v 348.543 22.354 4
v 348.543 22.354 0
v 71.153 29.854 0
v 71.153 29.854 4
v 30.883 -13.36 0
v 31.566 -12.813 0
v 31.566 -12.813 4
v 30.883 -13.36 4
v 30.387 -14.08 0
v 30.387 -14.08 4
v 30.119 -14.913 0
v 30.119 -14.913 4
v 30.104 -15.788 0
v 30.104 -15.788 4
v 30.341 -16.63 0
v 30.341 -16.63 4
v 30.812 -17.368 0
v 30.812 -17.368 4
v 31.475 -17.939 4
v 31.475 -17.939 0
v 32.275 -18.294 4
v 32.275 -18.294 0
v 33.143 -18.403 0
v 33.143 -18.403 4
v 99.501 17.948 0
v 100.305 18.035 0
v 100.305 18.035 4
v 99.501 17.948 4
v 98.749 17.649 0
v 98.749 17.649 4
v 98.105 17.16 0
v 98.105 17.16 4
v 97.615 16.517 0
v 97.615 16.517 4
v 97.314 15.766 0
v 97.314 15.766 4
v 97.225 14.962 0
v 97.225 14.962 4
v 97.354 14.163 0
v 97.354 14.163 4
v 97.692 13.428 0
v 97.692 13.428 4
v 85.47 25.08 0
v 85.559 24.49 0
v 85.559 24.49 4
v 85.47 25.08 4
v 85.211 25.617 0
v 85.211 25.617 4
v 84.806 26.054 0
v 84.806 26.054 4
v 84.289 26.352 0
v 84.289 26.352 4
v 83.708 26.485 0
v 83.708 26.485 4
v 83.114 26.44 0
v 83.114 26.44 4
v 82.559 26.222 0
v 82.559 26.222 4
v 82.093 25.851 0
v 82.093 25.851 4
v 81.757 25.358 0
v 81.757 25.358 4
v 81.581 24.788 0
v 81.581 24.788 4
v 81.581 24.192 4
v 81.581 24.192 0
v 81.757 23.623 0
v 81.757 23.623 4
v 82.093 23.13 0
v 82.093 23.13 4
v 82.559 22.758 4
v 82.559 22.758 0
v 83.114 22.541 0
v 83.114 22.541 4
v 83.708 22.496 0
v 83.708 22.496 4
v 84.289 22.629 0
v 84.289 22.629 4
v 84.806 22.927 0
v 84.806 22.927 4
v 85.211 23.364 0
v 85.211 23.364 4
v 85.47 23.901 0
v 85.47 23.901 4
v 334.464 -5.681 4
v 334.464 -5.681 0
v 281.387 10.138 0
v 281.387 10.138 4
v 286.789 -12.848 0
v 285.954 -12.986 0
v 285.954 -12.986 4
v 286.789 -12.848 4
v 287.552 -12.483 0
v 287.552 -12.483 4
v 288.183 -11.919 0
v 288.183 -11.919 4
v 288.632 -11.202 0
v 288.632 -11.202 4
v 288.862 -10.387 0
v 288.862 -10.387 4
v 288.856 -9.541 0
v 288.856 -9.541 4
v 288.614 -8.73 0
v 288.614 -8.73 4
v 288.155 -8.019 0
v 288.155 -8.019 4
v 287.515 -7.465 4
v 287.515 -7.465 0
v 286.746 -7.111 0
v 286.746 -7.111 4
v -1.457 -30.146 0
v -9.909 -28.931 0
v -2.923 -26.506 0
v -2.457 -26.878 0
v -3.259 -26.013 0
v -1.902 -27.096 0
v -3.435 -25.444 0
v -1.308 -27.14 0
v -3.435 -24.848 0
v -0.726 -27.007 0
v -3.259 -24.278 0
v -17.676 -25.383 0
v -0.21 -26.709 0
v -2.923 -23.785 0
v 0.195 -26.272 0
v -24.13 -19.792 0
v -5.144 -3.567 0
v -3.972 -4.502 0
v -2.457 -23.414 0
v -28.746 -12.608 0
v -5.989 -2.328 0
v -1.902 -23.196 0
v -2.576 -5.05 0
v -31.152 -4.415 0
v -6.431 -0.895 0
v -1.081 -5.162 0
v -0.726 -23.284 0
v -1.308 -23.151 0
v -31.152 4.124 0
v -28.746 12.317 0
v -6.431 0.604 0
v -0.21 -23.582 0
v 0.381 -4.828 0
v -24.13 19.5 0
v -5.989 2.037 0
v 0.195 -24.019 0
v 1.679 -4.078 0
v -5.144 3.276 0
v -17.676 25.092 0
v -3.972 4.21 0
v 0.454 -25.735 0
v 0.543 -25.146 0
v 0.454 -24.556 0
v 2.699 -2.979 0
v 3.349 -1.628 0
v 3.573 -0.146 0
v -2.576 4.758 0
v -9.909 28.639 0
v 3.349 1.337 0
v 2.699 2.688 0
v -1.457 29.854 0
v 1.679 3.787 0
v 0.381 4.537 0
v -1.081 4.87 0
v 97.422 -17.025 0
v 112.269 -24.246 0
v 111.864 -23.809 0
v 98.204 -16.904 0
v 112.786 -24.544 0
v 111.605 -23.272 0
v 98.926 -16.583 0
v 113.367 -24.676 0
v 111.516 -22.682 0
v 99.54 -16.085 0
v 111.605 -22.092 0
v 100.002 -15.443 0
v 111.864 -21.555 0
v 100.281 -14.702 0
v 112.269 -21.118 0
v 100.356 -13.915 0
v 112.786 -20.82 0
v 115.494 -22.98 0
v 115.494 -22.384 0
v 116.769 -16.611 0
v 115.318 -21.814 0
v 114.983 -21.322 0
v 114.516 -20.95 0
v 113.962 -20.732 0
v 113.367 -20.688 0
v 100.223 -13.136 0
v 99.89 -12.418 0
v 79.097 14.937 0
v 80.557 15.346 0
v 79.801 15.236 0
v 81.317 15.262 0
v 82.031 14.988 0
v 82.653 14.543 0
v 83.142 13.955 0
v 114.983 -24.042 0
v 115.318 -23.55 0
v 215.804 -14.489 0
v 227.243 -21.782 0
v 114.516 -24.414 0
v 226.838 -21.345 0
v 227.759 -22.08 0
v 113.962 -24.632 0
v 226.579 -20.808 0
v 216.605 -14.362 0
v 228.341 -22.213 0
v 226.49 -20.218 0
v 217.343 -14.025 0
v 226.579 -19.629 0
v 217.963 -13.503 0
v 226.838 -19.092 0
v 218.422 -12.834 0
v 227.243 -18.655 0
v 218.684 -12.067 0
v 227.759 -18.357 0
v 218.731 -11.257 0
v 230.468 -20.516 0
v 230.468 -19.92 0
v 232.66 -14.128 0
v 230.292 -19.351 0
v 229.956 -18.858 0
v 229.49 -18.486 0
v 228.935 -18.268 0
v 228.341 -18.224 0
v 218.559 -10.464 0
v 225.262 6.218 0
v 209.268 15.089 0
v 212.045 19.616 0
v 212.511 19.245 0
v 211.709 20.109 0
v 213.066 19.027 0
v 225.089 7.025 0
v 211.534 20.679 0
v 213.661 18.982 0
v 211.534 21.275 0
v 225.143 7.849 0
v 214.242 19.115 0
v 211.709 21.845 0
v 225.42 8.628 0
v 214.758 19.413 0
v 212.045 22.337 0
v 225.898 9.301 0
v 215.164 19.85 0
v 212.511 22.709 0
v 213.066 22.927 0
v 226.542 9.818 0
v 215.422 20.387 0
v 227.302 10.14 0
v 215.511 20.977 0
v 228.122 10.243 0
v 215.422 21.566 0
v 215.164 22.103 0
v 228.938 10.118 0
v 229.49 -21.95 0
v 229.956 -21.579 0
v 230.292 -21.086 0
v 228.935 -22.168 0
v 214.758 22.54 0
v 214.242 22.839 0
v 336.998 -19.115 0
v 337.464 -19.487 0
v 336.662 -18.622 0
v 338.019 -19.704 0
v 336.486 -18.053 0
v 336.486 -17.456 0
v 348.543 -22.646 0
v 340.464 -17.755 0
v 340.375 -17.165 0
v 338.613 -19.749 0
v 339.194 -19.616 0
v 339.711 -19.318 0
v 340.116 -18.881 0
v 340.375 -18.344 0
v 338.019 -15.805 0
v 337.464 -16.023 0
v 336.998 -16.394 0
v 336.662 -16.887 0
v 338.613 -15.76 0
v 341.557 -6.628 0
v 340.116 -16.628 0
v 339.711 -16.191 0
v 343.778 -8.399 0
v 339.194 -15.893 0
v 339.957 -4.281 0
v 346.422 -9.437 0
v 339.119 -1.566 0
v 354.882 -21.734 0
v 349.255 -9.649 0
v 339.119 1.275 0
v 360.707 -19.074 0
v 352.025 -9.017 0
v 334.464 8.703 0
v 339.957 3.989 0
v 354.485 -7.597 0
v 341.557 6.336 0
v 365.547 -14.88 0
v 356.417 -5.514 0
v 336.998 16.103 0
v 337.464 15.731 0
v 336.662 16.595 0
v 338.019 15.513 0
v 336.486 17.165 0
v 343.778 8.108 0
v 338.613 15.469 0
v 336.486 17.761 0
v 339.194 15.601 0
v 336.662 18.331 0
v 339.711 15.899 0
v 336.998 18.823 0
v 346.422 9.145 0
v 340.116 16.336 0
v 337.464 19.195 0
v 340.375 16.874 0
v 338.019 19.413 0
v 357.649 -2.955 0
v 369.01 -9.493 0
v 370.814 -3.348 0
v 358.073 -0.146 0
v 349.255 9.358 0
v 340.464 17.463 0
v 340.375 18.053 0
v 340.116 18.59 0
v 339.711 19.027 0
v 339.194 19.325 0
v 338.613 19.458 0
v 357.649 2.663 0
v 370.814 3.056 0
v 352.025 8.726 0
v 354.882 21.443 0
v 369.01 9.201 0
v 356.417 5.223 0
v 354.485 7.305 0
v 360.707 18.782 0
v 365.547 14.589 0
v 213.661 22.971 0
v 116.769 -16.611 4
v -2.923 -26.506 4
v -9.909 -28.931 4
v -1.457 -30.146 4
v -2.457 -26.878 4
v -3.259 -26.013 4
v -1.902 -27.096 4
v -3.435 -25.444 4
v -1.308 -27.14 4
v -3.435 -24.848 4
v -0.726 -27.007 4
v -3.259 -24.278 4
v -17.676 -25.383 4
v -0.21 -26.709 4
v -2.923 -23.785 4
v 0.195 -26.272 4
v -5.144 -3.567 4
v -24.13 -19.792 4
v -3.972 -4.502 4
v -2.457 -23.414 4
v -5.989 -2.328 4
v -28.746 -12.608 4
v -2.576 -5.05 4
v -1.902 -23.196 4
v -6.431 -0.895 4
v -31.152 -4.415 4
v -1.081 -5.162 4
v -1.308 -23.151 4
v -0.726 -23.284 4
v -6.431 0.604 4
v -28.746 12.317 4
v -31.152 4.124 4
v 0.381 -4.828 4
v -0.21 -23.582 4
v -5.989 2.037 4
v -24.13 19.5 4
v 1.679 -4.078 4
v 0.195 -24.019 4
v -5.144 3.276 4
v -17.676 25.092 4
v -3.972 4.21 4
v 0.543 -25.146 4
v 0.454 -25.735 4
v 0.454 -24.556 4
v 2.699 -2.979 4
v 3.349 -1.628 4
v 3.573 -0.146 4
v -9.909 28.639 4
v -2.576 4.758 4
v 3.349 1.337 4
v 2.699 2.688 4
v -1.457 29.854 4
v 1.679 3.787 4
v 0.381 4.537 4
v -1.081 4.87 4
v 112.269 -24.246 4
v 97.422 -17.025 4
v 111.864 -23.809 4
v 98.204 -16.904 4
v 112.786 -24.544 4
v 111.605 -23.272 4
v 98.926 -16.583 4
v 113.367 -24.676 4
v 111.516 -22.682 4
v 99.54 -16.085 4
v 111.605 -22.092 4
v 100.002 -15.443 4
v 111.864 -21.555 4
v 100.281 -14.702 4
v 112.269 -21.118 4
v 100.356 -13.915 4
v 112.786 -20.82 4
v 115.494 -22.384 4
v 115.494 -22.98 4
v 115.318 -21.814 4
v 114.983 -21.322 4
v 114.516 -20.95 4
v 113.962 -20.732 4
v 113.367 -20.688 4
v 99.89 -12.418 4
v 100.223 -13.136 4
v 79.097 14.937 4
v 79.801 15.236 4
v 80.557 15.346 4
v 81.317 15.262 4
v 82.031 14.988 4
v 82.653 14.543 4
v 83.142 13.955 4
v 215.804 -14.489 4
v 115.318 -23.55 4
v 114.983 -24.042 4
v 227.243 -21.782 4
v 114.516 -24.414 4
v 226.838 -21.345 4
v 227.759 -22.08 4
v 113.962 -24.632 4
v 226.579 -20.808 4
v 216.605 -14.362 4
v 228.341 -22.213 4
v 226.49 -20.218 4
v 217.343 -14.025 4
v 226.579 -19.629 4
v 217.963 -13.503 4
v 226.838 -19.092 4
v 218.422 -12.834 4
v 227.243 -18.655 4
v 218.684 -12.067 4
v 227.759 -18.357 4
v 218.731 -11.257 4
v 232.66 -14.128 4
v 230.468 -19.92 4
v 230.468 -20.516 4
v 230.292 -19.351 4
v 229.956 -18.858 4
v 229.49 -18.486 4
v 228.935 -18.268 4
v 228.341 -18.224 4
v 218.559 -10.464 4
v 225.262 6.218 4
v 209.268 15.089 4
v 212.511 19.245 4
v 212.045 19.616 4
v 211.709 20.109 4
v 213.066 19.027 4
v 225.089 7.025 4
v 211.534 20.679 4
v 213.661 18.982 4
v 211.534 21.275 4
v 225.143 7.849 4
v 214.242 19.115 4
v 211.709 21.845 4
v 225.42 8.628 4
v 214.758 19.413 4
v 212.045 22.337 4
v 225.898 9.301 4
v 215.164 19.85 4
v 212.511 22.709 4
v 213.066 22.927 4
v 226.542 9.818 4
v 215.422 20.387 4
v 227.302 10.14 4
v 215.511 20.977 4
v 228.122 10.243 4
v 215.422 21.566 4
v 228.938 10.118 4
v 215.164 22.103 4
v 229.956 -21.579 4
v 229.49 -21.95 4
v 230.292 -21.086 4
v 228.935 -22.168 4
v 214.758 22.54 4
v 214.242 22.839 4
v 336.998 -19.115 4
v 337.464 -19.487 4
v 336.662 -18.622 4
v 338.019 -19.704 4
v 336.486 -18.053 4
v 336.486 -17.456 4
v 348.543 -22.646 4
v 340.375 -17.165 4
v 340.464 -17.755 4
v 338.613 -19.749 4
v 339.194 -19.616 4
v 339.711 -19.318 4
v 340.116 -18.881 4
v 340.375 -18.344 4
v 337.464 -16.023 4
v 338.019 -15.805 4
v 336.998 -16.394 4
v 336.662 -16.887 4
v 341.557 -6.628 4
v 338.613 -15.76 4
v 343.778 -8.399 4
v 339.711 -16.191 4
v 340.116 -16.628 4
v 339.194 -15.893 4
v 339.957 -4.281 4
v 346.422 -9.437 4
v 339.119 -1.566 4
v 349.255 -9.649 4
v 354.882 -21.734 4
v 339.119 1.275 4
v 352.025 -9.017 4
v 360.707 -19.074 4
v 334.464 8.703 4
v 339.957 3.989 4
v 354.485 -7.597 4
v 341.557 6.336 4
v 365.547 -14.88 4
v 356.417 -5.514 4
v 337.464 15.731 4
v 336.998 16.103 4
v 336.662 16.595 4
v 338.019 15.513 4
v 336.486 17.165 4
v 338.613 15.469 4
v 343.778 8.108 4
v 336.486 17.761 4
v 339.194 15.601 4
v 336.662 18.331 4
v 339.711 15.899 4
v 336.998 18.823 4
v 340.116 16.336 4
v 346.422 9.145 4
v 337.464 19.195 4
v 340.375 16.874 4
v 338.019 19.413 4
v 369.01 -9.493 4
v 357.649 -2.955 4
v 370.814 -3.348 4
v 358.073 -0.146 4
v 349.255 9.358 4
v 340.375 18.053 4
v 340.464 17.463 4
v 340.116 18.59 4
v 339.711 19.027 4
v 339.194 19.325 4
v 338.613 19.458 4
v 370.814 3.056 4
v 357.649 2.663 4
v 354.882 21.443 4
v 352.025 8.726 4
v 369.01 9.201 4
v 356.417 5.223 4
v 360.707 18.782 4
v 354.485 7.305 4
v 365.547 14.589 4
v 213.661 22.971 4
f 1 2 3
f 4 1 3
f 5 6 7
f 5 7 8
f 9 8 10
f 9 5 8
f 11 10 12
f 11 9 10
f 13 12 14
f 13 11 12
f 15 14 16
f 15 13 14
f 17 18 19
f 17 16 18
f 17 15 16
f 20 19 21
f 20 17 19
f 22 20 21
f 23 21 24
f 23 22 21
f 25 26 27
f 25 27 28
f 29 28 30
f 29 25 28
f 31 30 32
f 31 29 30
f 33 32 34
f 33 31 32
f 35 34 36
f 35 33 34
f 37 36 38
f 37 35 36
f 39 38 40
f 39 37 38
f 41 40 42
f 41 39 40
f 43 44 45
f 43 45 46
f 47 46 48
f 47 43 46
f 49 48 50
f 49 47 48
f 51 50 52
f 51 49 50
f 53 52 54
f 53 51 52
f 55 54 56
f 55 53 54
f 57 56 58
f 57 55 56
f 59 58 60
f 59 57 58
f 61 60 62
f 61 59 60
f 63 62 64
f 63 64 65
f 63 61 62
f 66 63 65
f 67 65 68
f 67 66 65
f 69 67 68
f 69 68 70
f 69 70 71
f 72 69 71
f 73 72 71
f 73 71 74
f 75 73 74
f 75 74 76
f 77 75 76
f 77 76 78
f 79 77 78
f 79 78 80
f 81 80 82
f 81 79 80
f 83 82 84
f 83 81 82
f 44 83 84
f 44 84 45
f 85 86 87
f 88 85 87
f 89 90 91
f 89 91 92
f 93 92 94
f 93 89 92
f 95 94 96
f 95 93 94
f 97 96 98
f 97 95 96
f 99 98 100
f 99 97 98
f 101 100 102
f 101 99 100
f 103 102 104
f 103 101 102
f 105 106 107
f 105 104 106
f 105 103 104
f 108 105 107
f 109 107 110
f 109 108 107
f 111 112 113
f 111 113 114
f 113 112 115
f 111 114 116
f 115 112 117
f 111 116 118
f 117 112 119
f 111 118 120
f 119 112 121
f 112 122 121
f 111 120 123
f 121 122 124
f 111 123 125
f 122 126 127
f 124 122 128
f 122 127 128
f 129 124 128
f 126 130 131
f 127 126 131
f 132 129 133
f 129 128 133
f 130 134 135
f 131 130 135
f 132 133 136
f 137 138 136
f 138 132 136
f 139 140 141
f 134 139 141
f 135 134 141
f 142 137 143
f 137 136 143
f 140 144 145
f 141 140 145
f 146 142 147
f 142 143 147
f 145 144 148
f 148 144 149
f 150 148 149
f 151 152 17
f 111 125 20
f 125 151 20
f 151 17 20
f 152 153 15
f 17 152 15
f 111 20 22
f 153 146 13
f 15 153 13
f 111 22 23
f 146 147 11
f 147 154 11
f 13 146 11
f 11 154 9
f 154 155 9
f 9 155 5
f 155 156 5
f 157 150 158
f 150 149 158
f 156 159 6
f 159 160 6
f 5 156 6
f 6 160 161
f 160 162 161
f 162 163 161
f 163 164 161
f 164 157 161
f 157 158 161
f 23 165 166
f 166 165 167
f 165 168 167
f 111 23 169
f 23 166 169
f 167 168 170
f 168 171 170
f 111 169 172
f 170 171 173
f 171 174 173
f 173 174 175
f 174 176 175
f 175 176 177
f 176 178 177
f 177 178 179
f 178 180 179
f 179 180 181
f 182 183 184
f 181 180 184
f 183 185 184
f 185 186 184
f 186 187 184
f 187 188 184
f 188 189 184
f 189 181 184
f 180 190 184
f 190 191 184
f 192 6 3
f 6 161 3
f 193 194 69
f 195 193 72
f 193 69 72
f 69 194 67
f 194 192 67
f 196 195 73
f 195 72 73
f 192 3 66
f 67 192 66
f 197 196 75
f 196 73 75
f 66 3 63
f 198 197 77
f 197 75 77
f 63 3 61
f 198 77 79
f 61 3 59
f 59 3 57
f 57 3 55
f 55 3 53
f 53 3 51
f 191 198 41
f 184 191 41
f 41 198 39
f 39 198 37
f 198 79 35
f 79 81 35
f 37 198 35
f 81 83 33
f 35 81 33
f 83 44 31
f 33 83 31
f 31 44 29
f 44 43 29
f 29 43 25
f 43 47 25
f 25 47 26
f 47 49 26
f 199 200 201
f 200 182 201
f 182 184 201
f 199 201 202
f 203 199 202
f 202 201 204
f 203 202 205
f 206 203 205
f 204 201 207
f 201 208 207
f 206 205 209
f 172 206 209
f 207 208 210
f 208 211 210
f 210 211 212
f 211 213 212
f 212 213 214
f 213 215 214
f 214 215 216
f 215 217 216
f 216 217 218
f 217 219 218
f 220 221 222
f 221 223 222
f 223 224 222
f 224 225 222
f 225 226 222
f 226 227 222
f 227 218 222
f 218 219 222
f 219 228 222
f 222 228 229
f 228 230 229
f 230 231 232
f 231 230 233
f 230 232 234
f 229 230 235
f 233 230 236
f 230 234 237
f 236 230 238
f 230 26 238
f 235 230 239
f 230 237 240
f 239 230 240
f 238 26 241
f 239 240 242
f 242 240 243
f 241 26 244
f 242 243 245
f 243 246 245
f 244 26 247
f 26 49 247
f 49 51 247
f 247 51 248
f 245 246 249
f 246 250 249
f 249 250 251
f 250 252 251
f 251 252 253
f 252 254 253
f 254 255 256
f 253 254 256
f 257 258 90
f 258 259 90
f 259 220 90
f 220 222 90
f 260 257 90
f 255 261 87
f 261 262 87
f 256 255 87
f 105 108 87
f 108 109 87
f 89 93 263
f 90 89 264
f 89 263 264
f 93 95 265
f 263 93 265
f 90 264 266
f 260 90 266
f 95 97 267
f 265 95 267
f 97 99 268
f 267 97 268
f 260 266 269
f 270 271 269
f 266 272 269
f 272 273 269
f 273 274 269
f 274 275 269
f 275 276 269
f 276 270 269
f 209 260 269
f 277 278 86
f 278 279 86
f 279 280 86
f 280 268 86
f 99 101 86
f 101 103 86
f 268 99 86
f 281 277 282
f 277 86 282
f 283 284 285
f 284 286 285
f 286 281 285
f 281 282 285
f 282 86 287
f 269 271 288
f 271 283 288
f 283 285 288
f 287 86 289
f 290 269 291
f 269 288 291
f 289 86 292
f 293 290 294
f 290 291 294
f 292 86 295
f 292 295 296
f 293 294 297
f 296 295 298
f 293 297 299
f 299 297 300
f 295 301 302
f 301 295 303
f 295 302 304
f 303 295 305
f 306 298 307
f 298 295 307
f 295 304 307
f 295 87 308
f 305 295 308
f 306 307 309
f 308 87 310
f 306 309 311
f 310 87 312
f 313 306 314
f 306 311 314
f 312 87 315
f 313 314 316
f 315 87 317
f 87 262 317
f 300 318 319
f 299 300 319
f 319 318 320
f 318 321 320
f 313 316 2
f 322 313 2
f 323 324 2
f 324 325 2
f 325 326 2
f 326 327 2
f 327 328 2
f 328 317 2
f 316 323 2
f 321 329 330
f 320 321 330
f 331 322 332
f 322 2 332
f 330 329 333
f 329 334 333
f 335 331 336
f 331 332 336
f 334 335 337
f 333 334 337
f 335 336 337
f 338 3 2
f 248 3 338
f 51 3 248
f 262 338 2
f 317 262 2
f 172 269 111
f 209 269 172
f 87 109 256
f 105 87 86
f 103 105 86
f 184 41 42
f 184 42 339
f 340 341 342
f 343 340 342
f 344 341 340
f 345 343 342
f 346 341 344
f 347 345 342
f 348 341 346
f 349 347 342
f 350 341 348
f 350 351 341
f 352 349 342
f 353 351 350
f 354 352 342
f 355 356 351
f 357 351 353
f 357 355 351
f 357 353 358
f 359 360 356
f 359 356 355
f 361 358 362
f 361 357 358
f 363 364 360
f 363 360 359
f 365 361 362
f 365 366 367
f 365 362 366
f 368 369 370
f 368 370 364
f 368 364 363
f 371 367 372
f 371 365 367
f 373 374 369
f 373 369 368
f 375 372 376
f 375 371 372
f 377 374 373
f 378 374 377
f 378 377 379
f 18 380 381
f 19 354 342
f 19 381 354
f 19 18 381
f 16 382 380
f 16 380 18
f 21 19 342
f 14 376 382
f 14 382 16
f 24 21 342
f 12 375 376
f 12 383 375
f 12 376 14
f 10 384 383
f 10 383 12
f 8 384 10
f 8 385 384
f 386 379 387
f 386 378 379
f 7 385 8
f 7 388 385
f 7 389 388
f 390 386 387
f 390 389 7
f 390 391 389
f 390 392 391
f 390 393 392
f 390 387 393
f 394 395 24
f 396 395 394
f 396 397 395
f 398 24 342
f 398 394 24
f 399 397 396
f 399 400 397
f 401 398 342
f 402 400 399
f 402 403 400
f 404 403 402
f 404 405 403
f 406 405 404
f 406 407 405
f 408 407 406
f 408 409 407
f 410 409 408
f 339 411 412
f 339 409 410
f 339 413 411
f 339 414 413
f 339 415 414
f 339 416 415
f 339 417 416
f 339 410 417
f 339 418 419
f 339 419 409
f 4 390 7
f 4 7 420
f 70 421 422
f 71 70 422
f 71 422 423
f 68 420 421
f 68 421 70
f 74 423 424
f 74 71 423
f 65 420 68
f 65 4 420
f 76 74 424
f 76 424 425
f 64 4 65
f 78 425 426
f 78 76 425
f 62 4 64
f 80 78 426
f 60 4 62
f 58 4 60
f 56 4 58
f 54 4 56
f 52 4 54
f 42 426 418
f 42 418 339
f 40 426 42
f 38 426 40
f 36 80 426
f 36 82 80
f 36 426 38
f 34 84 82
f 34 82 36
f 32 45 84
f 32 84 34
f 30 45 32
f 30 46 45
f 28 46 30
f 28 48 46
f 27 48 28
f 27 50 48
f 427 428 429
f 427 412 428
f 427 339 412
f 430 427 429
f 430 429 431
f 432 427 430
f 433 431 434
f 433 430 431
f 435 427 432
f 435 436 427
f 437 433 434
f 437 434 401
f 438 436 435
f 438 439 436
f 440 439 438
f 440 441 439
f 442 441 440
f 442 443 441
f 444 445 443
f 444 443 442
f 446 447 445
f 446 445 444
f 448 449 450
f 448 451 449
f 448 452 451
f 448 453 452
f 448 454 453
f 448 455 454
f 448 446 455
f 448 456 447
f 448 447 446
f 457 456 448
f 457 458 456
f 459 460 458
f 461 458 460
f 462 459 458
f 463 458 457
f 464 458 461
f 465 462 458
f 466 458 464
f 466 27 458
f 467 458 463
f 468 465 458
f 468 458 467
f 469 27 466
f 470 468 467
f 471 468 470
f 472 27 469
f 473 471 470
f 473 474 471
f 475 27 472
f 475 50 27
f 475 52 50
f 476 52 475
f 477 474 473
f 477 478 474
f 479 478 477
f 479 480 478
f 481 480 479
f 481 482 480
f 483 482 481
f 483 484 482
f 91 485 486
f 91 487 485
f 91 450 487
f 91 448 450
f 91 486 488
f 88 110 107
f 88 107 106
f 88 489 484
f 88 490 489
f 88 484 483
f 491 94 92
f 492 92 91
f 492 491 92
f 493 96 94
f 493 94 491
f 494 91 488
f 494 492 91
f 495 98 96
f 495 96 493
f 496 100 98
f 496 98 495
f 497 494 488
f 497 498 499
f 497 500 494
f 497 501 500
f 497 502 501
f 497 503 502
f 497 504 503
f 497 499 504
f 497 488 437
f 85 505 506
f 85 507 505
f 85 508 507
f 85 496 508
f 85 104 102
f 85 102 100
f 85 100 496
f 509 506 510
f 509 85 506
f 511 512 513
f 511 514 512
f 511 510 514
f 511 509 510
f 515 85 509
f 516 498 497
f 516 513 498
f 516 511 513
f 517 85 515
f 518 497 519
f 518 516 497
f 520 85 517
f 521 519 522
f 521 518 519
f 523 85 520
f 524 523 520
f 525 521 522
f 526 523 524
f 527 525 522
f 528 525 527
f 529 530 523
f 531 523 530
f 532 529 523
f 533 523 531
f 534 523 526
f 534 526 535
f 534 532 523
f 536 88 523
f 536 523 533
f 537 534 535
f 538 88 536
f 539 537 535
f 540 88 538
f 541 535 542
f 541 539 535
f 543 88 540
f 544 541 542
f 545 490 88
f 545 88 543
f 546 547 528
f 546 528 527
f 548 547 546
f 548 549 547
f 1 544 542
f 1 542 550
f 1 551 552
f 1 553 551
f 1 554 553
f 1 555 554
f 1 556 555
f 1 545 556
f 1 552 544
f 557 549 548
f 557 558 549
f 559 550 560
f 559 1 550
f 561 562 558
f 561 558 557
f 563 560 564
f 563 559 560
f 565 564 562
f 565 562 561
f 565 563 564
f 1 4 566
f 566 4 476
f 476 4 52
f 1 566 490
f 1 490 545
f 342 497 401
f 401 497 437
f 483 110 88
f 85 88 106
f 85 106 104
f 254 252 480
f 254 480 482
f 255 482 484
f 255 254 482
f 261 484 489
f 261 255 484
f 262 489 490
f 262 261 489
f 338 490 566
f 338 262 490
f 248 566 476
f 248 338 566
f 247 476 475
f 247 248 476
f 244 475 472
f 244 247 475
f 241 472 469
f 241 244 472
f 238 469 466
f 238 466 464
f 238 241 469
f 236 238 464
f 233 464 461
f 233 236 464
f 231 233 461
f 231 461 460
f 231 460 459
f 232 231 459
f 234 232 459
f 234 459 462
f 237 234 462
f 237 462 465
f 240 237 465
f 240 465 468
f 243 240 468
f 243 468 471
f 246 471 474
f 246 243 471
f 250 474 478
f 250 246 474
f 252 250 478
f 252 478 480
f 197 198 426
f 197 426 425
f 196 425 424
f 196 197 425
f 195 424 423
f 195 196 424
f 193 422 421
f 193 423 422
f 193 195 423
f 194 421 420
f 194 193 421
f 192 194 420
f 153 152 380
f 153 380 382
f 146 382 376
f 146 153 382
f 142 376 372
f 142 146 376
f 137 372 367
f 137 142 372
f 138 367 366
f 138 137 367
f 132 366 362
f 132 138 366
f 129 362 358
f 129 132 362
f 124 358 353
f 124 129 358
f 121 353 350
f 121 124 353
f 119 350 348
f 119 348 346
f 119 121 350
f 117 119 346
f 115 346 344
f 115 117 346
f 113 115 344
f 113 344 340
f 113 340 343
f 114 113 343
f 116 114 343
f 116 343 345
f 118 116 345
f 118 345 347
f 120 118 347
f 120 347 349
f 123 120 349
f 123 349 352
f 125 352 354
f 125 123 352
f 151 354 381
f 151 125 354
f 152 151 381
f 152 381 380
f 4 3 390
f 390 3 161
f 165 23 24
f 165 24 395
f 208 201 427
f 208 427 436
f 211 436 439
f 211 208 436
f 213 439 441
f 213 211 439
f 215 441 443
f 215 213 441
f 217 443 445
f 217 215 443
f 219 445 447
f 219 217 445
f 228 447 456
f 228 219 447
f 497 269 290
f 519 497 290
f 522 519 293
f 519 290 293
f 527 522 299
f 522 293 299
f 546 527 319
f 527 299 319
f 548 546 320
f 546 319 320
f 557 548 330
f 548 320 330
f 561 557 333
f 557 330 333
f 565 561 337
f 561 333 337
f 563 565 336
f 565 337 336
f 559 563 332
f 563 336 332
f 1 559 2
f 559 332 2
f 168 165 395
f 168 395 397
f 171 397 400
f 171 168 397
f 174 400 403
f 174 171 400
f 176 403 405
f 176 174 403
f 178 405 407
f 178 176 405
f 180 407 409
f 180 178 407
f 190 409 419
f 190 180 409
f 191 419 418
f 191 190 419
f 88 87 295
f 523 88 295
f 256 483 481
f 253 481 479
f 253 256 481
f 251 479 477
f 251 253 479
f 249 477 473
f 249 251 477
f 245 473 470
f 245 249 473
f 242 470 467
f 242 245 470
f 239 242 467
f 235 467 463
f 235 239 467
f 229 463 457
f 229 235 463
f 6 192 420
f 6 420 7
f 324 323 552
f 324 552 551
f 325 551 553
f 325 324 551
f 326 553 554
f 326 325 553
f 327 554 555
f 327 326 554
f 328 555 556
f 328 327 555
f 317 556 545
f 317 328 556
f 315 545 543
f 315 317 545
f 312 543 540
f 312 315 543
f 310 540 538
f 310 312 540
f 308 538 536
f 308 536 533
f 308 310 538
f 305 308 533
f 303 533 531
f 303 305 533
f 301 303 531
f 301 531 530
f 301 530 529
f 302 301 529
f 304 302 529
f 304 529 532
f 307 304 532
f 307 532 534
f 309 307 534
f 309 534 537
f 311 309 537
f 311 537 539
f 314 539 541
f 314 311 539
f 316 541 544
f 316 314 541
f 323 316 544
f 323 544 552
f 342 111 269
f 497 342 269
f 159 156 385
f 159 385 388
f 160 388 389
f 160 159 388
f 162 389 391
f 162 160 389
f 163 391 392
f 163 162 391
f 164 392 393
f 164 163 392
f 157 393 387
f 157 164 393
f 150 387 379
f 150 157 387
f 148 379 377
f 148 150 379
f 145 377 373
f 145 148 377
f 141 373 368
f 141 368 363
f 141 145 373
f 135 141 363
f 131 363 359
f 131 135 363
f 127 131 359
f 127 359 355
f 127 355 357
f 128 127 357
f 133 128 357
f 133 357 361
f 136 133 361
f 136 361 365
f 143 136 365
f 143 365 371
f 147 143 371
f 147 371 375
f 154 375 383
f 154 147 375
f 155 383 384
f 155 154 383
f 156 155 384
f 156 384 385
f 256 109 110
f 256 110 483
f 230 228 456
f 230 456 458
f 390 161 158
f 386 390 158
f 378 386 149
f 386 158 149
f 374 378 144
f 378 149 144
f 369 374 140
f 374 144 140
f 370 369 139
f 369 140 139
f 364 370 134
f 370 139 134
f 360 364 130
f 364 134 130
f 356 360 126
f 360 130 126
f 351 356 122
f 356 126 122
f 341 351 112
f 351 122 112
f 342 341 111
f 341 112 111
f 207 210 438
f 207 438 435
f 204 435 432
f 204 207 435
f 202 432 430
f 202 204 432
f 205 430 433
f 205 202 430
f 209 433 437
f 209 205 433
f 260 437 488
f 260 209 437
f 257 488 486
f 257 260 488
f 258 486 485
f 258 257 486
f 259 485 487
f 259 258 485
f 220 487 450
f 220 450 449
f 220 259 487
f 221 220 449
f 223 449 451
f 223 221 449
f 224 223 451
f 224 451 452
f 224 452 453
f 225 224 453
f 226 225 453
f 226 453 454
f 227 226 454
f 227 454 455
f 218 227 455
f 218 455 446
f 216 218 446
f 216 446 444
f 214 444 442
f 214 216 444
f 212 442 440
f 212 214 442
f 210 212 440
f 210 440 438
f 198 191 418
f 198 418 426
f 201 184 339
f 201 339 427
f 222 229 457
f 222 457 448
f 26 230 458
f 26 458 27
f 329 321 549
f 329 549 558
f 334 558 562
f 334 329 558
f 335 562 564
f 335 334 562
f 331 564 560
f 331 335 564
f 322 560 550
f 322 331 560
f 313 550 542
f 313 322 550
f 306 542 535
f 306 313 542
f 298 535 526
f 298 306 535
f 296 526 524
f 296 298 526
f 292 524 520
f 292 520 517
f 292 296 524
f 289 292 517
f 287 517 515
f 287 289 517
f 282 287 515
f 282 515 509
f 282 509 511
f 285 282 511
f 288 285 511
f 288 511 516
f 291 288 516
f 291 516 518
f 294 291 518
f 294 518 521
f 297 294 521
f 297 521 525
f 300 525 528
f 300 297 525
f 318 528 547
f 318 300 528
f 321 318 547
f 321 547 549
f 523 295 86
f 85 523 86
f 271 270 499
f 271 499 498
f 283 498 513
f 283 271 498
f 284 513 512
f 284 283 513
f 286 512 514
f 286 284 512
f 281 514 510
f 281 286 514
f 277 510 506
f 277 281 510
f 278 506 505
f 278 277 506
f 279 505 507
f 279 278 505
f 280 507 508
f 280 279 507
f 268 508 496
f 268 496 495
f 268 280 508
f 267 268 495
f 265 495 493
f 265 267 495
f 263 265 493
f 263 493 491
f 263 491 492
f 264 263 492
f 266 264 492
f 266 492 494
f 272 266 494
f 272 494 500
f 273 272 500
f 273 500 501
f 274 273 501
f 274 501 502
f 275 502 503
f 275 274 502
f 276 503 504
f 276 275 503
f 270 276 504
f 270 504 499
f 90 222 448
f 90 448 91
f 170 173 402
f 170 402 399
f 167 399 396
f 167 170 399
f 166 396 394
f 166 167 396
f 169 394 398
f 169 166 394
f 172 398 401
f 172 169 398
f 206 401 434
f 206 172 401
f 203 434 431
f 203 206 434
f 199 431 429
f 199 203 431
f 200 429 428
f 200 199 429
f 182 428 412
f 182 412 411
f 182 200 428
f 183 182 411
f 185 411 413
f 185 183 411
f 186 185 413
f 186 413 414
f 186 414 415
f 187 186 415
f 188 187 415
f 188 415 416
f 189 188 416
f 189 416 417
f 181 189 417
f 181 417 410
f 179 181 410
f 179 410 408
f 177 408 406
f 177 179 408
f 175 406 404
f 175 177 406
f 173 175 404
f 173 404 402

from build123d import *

# Parameters (mm, degrees)
SKETCH_1_R          = 5.03
SKETCH_1_R_2        = 9.53
SKETCH_1_R_3        = 2
EXTRUDE_1_DEPTH     = 4
CUT_EXTRUDE_1_DEPTH = 10


with BuildPart() as part:
    # 草图1 → 凸台-拉伸1 (new body)
    with BuildSketch(Plane.XY):
        with BuildLine():
            Line((348.542857143, 22.354285714), (71.15327348, 29.854285714))
            Line((71.15327348, 29.854285714), (-1.457142857, 29.854285714))
            ThreePointArc((-1.457142857, 29.854285714), (-31.457142857, -0.145714286), (-1.457142857, -30.145714286))
            Line((-1.457142857, -30.145714286), (348.542857143, -22.645714286))
            ThreePointArc((348.542857143, -22.645714286), (371.042857143, -0.145714286), (348.542857143, 22.354285714))
        make_face()
        with Locations((-1.457142857, -0.145714286)):
            Circle(SKETCH_1_R, mode=Mode.SUBTRACT)
        with Locations((348.542857143, -0.145714286)):
            Circle(SKETCH_1_R_2, mode=Mode.SUBTRACT)
        with Locations((-1.457142857, -25.145714286)):
            Circle(SKETCH_1_R_3, mode=Mode.SUBTRACT)
        with Locations((83.558658591, 24.490381358)):
            Circle(SKETCH_1_R_3, mode=Mode.SUBTRACT)
        with Locations((213.511166909, 20.976753342)):
            Circle(SKETCH_1_R_3, mode=Mode.SUBTRACT)
        with Locations(Location((228.490069199, -20.218274027, 0), (0, 0, 180))):
            Circle(SKETCH_1_R_3, mode=Mode.SUBTRACT)
        with Locations(Location((113.516463171, -22.681994157, 0), (0, 0, 180))):
            Circle(SKETCH_1_R_3, mode=Mode.SUBTRACT)
        with Locations((338.463675227, -17.754553898)):
            Circle(SKETCH_1_R_3, mode=Mode.SUBTRACT)
        with Locations((338.463675227, 17.463125327)):
            Circle(SKETCH_1_R_3, mode=Mode.SUBTRACT)
    extrude(amount=EXTRUDE_1_DEPTH)

    # 草图4 → 切除-拉伸1 (cut)
    with BuildSketch(Plane(origin=(0, 0, 0), x_dir=(-1, 0, 0), z_dir=(0, 0, -1))):
        with BuildLine():
            Line((-79.096608398, 14.937462311), (-31.566415003, -12.812828637))
            ThreePointArc((-31.566415003, -12.812828637), (-30.191694318, -16.218057795), (-33.143289006, -18.402899067))
            Line((-33.143289006, -18.402899067), (-97.422136429, -17.025495194))
            ThreePointArc((-97.422136429, -17.025495194), (-100.002344972, -15.442774062), (-99.890331665, -12.41788806))
            Line((-99.890331665, -12.41788806), (-83.141677637, 13.954999014))
            ThreePointArc((-83.141677637, 13.954999014), (-81.317264225, 15.261949688), (-79.096608398, 14.937462311))
        make_face()
        with BuildLine():
            Line((-116.768601629, -16.610928082), (-215.80395994, -14.488741833))
            ThreePointArc((-215.80395994, -14.488741833), (-218.215167386, -13.18412995), (-218.559093597, -10.464268138))
            Line((-218.559093597, -10.464268138), (-209.267574838, 15.089297949))
            Line((-209.267574838, 15.089297949), (-100.305174274, 18.035399938))
            ThreePointArc((-100.305174274, 18.035399938), (-97.614705316, 16.516735307), (-97.691624355, 13.428200228))
            Line((-97.691624355, 13.428200228), (-116.768601629, -16.610928082))
        make_face()
        with BuildLine():
            Line((-232.659749539, -14.127546341), (-285.953651799, -12.98553415))
            ThreePointArc((-285.953651799, -12.98553415), (-288.86244016, -10.38736889), (-286.746258648, -7.111199137))
            Line((-286.746258648, -7.111199137), (-228.938261452, 10.118012745))
            ThreePointArc((-228.938261452, 10.118012745), (-225.898326118, 9.300720915), (-225.261979027, 6.217826959))
            Line((-225.261979027, 6.217826959), (-232.659749539, -14.127546341))
        make_face()
        Polygon((-334.463675227, -5.68094836), (-281.386552555, 10.138264153), (-334.463675227, 8.703176307), align=None)
    extrude(amount=-CUT_EXTRUDE_1_DEPTH, mode=Mode.SUBTRACT)


solid = part.part
